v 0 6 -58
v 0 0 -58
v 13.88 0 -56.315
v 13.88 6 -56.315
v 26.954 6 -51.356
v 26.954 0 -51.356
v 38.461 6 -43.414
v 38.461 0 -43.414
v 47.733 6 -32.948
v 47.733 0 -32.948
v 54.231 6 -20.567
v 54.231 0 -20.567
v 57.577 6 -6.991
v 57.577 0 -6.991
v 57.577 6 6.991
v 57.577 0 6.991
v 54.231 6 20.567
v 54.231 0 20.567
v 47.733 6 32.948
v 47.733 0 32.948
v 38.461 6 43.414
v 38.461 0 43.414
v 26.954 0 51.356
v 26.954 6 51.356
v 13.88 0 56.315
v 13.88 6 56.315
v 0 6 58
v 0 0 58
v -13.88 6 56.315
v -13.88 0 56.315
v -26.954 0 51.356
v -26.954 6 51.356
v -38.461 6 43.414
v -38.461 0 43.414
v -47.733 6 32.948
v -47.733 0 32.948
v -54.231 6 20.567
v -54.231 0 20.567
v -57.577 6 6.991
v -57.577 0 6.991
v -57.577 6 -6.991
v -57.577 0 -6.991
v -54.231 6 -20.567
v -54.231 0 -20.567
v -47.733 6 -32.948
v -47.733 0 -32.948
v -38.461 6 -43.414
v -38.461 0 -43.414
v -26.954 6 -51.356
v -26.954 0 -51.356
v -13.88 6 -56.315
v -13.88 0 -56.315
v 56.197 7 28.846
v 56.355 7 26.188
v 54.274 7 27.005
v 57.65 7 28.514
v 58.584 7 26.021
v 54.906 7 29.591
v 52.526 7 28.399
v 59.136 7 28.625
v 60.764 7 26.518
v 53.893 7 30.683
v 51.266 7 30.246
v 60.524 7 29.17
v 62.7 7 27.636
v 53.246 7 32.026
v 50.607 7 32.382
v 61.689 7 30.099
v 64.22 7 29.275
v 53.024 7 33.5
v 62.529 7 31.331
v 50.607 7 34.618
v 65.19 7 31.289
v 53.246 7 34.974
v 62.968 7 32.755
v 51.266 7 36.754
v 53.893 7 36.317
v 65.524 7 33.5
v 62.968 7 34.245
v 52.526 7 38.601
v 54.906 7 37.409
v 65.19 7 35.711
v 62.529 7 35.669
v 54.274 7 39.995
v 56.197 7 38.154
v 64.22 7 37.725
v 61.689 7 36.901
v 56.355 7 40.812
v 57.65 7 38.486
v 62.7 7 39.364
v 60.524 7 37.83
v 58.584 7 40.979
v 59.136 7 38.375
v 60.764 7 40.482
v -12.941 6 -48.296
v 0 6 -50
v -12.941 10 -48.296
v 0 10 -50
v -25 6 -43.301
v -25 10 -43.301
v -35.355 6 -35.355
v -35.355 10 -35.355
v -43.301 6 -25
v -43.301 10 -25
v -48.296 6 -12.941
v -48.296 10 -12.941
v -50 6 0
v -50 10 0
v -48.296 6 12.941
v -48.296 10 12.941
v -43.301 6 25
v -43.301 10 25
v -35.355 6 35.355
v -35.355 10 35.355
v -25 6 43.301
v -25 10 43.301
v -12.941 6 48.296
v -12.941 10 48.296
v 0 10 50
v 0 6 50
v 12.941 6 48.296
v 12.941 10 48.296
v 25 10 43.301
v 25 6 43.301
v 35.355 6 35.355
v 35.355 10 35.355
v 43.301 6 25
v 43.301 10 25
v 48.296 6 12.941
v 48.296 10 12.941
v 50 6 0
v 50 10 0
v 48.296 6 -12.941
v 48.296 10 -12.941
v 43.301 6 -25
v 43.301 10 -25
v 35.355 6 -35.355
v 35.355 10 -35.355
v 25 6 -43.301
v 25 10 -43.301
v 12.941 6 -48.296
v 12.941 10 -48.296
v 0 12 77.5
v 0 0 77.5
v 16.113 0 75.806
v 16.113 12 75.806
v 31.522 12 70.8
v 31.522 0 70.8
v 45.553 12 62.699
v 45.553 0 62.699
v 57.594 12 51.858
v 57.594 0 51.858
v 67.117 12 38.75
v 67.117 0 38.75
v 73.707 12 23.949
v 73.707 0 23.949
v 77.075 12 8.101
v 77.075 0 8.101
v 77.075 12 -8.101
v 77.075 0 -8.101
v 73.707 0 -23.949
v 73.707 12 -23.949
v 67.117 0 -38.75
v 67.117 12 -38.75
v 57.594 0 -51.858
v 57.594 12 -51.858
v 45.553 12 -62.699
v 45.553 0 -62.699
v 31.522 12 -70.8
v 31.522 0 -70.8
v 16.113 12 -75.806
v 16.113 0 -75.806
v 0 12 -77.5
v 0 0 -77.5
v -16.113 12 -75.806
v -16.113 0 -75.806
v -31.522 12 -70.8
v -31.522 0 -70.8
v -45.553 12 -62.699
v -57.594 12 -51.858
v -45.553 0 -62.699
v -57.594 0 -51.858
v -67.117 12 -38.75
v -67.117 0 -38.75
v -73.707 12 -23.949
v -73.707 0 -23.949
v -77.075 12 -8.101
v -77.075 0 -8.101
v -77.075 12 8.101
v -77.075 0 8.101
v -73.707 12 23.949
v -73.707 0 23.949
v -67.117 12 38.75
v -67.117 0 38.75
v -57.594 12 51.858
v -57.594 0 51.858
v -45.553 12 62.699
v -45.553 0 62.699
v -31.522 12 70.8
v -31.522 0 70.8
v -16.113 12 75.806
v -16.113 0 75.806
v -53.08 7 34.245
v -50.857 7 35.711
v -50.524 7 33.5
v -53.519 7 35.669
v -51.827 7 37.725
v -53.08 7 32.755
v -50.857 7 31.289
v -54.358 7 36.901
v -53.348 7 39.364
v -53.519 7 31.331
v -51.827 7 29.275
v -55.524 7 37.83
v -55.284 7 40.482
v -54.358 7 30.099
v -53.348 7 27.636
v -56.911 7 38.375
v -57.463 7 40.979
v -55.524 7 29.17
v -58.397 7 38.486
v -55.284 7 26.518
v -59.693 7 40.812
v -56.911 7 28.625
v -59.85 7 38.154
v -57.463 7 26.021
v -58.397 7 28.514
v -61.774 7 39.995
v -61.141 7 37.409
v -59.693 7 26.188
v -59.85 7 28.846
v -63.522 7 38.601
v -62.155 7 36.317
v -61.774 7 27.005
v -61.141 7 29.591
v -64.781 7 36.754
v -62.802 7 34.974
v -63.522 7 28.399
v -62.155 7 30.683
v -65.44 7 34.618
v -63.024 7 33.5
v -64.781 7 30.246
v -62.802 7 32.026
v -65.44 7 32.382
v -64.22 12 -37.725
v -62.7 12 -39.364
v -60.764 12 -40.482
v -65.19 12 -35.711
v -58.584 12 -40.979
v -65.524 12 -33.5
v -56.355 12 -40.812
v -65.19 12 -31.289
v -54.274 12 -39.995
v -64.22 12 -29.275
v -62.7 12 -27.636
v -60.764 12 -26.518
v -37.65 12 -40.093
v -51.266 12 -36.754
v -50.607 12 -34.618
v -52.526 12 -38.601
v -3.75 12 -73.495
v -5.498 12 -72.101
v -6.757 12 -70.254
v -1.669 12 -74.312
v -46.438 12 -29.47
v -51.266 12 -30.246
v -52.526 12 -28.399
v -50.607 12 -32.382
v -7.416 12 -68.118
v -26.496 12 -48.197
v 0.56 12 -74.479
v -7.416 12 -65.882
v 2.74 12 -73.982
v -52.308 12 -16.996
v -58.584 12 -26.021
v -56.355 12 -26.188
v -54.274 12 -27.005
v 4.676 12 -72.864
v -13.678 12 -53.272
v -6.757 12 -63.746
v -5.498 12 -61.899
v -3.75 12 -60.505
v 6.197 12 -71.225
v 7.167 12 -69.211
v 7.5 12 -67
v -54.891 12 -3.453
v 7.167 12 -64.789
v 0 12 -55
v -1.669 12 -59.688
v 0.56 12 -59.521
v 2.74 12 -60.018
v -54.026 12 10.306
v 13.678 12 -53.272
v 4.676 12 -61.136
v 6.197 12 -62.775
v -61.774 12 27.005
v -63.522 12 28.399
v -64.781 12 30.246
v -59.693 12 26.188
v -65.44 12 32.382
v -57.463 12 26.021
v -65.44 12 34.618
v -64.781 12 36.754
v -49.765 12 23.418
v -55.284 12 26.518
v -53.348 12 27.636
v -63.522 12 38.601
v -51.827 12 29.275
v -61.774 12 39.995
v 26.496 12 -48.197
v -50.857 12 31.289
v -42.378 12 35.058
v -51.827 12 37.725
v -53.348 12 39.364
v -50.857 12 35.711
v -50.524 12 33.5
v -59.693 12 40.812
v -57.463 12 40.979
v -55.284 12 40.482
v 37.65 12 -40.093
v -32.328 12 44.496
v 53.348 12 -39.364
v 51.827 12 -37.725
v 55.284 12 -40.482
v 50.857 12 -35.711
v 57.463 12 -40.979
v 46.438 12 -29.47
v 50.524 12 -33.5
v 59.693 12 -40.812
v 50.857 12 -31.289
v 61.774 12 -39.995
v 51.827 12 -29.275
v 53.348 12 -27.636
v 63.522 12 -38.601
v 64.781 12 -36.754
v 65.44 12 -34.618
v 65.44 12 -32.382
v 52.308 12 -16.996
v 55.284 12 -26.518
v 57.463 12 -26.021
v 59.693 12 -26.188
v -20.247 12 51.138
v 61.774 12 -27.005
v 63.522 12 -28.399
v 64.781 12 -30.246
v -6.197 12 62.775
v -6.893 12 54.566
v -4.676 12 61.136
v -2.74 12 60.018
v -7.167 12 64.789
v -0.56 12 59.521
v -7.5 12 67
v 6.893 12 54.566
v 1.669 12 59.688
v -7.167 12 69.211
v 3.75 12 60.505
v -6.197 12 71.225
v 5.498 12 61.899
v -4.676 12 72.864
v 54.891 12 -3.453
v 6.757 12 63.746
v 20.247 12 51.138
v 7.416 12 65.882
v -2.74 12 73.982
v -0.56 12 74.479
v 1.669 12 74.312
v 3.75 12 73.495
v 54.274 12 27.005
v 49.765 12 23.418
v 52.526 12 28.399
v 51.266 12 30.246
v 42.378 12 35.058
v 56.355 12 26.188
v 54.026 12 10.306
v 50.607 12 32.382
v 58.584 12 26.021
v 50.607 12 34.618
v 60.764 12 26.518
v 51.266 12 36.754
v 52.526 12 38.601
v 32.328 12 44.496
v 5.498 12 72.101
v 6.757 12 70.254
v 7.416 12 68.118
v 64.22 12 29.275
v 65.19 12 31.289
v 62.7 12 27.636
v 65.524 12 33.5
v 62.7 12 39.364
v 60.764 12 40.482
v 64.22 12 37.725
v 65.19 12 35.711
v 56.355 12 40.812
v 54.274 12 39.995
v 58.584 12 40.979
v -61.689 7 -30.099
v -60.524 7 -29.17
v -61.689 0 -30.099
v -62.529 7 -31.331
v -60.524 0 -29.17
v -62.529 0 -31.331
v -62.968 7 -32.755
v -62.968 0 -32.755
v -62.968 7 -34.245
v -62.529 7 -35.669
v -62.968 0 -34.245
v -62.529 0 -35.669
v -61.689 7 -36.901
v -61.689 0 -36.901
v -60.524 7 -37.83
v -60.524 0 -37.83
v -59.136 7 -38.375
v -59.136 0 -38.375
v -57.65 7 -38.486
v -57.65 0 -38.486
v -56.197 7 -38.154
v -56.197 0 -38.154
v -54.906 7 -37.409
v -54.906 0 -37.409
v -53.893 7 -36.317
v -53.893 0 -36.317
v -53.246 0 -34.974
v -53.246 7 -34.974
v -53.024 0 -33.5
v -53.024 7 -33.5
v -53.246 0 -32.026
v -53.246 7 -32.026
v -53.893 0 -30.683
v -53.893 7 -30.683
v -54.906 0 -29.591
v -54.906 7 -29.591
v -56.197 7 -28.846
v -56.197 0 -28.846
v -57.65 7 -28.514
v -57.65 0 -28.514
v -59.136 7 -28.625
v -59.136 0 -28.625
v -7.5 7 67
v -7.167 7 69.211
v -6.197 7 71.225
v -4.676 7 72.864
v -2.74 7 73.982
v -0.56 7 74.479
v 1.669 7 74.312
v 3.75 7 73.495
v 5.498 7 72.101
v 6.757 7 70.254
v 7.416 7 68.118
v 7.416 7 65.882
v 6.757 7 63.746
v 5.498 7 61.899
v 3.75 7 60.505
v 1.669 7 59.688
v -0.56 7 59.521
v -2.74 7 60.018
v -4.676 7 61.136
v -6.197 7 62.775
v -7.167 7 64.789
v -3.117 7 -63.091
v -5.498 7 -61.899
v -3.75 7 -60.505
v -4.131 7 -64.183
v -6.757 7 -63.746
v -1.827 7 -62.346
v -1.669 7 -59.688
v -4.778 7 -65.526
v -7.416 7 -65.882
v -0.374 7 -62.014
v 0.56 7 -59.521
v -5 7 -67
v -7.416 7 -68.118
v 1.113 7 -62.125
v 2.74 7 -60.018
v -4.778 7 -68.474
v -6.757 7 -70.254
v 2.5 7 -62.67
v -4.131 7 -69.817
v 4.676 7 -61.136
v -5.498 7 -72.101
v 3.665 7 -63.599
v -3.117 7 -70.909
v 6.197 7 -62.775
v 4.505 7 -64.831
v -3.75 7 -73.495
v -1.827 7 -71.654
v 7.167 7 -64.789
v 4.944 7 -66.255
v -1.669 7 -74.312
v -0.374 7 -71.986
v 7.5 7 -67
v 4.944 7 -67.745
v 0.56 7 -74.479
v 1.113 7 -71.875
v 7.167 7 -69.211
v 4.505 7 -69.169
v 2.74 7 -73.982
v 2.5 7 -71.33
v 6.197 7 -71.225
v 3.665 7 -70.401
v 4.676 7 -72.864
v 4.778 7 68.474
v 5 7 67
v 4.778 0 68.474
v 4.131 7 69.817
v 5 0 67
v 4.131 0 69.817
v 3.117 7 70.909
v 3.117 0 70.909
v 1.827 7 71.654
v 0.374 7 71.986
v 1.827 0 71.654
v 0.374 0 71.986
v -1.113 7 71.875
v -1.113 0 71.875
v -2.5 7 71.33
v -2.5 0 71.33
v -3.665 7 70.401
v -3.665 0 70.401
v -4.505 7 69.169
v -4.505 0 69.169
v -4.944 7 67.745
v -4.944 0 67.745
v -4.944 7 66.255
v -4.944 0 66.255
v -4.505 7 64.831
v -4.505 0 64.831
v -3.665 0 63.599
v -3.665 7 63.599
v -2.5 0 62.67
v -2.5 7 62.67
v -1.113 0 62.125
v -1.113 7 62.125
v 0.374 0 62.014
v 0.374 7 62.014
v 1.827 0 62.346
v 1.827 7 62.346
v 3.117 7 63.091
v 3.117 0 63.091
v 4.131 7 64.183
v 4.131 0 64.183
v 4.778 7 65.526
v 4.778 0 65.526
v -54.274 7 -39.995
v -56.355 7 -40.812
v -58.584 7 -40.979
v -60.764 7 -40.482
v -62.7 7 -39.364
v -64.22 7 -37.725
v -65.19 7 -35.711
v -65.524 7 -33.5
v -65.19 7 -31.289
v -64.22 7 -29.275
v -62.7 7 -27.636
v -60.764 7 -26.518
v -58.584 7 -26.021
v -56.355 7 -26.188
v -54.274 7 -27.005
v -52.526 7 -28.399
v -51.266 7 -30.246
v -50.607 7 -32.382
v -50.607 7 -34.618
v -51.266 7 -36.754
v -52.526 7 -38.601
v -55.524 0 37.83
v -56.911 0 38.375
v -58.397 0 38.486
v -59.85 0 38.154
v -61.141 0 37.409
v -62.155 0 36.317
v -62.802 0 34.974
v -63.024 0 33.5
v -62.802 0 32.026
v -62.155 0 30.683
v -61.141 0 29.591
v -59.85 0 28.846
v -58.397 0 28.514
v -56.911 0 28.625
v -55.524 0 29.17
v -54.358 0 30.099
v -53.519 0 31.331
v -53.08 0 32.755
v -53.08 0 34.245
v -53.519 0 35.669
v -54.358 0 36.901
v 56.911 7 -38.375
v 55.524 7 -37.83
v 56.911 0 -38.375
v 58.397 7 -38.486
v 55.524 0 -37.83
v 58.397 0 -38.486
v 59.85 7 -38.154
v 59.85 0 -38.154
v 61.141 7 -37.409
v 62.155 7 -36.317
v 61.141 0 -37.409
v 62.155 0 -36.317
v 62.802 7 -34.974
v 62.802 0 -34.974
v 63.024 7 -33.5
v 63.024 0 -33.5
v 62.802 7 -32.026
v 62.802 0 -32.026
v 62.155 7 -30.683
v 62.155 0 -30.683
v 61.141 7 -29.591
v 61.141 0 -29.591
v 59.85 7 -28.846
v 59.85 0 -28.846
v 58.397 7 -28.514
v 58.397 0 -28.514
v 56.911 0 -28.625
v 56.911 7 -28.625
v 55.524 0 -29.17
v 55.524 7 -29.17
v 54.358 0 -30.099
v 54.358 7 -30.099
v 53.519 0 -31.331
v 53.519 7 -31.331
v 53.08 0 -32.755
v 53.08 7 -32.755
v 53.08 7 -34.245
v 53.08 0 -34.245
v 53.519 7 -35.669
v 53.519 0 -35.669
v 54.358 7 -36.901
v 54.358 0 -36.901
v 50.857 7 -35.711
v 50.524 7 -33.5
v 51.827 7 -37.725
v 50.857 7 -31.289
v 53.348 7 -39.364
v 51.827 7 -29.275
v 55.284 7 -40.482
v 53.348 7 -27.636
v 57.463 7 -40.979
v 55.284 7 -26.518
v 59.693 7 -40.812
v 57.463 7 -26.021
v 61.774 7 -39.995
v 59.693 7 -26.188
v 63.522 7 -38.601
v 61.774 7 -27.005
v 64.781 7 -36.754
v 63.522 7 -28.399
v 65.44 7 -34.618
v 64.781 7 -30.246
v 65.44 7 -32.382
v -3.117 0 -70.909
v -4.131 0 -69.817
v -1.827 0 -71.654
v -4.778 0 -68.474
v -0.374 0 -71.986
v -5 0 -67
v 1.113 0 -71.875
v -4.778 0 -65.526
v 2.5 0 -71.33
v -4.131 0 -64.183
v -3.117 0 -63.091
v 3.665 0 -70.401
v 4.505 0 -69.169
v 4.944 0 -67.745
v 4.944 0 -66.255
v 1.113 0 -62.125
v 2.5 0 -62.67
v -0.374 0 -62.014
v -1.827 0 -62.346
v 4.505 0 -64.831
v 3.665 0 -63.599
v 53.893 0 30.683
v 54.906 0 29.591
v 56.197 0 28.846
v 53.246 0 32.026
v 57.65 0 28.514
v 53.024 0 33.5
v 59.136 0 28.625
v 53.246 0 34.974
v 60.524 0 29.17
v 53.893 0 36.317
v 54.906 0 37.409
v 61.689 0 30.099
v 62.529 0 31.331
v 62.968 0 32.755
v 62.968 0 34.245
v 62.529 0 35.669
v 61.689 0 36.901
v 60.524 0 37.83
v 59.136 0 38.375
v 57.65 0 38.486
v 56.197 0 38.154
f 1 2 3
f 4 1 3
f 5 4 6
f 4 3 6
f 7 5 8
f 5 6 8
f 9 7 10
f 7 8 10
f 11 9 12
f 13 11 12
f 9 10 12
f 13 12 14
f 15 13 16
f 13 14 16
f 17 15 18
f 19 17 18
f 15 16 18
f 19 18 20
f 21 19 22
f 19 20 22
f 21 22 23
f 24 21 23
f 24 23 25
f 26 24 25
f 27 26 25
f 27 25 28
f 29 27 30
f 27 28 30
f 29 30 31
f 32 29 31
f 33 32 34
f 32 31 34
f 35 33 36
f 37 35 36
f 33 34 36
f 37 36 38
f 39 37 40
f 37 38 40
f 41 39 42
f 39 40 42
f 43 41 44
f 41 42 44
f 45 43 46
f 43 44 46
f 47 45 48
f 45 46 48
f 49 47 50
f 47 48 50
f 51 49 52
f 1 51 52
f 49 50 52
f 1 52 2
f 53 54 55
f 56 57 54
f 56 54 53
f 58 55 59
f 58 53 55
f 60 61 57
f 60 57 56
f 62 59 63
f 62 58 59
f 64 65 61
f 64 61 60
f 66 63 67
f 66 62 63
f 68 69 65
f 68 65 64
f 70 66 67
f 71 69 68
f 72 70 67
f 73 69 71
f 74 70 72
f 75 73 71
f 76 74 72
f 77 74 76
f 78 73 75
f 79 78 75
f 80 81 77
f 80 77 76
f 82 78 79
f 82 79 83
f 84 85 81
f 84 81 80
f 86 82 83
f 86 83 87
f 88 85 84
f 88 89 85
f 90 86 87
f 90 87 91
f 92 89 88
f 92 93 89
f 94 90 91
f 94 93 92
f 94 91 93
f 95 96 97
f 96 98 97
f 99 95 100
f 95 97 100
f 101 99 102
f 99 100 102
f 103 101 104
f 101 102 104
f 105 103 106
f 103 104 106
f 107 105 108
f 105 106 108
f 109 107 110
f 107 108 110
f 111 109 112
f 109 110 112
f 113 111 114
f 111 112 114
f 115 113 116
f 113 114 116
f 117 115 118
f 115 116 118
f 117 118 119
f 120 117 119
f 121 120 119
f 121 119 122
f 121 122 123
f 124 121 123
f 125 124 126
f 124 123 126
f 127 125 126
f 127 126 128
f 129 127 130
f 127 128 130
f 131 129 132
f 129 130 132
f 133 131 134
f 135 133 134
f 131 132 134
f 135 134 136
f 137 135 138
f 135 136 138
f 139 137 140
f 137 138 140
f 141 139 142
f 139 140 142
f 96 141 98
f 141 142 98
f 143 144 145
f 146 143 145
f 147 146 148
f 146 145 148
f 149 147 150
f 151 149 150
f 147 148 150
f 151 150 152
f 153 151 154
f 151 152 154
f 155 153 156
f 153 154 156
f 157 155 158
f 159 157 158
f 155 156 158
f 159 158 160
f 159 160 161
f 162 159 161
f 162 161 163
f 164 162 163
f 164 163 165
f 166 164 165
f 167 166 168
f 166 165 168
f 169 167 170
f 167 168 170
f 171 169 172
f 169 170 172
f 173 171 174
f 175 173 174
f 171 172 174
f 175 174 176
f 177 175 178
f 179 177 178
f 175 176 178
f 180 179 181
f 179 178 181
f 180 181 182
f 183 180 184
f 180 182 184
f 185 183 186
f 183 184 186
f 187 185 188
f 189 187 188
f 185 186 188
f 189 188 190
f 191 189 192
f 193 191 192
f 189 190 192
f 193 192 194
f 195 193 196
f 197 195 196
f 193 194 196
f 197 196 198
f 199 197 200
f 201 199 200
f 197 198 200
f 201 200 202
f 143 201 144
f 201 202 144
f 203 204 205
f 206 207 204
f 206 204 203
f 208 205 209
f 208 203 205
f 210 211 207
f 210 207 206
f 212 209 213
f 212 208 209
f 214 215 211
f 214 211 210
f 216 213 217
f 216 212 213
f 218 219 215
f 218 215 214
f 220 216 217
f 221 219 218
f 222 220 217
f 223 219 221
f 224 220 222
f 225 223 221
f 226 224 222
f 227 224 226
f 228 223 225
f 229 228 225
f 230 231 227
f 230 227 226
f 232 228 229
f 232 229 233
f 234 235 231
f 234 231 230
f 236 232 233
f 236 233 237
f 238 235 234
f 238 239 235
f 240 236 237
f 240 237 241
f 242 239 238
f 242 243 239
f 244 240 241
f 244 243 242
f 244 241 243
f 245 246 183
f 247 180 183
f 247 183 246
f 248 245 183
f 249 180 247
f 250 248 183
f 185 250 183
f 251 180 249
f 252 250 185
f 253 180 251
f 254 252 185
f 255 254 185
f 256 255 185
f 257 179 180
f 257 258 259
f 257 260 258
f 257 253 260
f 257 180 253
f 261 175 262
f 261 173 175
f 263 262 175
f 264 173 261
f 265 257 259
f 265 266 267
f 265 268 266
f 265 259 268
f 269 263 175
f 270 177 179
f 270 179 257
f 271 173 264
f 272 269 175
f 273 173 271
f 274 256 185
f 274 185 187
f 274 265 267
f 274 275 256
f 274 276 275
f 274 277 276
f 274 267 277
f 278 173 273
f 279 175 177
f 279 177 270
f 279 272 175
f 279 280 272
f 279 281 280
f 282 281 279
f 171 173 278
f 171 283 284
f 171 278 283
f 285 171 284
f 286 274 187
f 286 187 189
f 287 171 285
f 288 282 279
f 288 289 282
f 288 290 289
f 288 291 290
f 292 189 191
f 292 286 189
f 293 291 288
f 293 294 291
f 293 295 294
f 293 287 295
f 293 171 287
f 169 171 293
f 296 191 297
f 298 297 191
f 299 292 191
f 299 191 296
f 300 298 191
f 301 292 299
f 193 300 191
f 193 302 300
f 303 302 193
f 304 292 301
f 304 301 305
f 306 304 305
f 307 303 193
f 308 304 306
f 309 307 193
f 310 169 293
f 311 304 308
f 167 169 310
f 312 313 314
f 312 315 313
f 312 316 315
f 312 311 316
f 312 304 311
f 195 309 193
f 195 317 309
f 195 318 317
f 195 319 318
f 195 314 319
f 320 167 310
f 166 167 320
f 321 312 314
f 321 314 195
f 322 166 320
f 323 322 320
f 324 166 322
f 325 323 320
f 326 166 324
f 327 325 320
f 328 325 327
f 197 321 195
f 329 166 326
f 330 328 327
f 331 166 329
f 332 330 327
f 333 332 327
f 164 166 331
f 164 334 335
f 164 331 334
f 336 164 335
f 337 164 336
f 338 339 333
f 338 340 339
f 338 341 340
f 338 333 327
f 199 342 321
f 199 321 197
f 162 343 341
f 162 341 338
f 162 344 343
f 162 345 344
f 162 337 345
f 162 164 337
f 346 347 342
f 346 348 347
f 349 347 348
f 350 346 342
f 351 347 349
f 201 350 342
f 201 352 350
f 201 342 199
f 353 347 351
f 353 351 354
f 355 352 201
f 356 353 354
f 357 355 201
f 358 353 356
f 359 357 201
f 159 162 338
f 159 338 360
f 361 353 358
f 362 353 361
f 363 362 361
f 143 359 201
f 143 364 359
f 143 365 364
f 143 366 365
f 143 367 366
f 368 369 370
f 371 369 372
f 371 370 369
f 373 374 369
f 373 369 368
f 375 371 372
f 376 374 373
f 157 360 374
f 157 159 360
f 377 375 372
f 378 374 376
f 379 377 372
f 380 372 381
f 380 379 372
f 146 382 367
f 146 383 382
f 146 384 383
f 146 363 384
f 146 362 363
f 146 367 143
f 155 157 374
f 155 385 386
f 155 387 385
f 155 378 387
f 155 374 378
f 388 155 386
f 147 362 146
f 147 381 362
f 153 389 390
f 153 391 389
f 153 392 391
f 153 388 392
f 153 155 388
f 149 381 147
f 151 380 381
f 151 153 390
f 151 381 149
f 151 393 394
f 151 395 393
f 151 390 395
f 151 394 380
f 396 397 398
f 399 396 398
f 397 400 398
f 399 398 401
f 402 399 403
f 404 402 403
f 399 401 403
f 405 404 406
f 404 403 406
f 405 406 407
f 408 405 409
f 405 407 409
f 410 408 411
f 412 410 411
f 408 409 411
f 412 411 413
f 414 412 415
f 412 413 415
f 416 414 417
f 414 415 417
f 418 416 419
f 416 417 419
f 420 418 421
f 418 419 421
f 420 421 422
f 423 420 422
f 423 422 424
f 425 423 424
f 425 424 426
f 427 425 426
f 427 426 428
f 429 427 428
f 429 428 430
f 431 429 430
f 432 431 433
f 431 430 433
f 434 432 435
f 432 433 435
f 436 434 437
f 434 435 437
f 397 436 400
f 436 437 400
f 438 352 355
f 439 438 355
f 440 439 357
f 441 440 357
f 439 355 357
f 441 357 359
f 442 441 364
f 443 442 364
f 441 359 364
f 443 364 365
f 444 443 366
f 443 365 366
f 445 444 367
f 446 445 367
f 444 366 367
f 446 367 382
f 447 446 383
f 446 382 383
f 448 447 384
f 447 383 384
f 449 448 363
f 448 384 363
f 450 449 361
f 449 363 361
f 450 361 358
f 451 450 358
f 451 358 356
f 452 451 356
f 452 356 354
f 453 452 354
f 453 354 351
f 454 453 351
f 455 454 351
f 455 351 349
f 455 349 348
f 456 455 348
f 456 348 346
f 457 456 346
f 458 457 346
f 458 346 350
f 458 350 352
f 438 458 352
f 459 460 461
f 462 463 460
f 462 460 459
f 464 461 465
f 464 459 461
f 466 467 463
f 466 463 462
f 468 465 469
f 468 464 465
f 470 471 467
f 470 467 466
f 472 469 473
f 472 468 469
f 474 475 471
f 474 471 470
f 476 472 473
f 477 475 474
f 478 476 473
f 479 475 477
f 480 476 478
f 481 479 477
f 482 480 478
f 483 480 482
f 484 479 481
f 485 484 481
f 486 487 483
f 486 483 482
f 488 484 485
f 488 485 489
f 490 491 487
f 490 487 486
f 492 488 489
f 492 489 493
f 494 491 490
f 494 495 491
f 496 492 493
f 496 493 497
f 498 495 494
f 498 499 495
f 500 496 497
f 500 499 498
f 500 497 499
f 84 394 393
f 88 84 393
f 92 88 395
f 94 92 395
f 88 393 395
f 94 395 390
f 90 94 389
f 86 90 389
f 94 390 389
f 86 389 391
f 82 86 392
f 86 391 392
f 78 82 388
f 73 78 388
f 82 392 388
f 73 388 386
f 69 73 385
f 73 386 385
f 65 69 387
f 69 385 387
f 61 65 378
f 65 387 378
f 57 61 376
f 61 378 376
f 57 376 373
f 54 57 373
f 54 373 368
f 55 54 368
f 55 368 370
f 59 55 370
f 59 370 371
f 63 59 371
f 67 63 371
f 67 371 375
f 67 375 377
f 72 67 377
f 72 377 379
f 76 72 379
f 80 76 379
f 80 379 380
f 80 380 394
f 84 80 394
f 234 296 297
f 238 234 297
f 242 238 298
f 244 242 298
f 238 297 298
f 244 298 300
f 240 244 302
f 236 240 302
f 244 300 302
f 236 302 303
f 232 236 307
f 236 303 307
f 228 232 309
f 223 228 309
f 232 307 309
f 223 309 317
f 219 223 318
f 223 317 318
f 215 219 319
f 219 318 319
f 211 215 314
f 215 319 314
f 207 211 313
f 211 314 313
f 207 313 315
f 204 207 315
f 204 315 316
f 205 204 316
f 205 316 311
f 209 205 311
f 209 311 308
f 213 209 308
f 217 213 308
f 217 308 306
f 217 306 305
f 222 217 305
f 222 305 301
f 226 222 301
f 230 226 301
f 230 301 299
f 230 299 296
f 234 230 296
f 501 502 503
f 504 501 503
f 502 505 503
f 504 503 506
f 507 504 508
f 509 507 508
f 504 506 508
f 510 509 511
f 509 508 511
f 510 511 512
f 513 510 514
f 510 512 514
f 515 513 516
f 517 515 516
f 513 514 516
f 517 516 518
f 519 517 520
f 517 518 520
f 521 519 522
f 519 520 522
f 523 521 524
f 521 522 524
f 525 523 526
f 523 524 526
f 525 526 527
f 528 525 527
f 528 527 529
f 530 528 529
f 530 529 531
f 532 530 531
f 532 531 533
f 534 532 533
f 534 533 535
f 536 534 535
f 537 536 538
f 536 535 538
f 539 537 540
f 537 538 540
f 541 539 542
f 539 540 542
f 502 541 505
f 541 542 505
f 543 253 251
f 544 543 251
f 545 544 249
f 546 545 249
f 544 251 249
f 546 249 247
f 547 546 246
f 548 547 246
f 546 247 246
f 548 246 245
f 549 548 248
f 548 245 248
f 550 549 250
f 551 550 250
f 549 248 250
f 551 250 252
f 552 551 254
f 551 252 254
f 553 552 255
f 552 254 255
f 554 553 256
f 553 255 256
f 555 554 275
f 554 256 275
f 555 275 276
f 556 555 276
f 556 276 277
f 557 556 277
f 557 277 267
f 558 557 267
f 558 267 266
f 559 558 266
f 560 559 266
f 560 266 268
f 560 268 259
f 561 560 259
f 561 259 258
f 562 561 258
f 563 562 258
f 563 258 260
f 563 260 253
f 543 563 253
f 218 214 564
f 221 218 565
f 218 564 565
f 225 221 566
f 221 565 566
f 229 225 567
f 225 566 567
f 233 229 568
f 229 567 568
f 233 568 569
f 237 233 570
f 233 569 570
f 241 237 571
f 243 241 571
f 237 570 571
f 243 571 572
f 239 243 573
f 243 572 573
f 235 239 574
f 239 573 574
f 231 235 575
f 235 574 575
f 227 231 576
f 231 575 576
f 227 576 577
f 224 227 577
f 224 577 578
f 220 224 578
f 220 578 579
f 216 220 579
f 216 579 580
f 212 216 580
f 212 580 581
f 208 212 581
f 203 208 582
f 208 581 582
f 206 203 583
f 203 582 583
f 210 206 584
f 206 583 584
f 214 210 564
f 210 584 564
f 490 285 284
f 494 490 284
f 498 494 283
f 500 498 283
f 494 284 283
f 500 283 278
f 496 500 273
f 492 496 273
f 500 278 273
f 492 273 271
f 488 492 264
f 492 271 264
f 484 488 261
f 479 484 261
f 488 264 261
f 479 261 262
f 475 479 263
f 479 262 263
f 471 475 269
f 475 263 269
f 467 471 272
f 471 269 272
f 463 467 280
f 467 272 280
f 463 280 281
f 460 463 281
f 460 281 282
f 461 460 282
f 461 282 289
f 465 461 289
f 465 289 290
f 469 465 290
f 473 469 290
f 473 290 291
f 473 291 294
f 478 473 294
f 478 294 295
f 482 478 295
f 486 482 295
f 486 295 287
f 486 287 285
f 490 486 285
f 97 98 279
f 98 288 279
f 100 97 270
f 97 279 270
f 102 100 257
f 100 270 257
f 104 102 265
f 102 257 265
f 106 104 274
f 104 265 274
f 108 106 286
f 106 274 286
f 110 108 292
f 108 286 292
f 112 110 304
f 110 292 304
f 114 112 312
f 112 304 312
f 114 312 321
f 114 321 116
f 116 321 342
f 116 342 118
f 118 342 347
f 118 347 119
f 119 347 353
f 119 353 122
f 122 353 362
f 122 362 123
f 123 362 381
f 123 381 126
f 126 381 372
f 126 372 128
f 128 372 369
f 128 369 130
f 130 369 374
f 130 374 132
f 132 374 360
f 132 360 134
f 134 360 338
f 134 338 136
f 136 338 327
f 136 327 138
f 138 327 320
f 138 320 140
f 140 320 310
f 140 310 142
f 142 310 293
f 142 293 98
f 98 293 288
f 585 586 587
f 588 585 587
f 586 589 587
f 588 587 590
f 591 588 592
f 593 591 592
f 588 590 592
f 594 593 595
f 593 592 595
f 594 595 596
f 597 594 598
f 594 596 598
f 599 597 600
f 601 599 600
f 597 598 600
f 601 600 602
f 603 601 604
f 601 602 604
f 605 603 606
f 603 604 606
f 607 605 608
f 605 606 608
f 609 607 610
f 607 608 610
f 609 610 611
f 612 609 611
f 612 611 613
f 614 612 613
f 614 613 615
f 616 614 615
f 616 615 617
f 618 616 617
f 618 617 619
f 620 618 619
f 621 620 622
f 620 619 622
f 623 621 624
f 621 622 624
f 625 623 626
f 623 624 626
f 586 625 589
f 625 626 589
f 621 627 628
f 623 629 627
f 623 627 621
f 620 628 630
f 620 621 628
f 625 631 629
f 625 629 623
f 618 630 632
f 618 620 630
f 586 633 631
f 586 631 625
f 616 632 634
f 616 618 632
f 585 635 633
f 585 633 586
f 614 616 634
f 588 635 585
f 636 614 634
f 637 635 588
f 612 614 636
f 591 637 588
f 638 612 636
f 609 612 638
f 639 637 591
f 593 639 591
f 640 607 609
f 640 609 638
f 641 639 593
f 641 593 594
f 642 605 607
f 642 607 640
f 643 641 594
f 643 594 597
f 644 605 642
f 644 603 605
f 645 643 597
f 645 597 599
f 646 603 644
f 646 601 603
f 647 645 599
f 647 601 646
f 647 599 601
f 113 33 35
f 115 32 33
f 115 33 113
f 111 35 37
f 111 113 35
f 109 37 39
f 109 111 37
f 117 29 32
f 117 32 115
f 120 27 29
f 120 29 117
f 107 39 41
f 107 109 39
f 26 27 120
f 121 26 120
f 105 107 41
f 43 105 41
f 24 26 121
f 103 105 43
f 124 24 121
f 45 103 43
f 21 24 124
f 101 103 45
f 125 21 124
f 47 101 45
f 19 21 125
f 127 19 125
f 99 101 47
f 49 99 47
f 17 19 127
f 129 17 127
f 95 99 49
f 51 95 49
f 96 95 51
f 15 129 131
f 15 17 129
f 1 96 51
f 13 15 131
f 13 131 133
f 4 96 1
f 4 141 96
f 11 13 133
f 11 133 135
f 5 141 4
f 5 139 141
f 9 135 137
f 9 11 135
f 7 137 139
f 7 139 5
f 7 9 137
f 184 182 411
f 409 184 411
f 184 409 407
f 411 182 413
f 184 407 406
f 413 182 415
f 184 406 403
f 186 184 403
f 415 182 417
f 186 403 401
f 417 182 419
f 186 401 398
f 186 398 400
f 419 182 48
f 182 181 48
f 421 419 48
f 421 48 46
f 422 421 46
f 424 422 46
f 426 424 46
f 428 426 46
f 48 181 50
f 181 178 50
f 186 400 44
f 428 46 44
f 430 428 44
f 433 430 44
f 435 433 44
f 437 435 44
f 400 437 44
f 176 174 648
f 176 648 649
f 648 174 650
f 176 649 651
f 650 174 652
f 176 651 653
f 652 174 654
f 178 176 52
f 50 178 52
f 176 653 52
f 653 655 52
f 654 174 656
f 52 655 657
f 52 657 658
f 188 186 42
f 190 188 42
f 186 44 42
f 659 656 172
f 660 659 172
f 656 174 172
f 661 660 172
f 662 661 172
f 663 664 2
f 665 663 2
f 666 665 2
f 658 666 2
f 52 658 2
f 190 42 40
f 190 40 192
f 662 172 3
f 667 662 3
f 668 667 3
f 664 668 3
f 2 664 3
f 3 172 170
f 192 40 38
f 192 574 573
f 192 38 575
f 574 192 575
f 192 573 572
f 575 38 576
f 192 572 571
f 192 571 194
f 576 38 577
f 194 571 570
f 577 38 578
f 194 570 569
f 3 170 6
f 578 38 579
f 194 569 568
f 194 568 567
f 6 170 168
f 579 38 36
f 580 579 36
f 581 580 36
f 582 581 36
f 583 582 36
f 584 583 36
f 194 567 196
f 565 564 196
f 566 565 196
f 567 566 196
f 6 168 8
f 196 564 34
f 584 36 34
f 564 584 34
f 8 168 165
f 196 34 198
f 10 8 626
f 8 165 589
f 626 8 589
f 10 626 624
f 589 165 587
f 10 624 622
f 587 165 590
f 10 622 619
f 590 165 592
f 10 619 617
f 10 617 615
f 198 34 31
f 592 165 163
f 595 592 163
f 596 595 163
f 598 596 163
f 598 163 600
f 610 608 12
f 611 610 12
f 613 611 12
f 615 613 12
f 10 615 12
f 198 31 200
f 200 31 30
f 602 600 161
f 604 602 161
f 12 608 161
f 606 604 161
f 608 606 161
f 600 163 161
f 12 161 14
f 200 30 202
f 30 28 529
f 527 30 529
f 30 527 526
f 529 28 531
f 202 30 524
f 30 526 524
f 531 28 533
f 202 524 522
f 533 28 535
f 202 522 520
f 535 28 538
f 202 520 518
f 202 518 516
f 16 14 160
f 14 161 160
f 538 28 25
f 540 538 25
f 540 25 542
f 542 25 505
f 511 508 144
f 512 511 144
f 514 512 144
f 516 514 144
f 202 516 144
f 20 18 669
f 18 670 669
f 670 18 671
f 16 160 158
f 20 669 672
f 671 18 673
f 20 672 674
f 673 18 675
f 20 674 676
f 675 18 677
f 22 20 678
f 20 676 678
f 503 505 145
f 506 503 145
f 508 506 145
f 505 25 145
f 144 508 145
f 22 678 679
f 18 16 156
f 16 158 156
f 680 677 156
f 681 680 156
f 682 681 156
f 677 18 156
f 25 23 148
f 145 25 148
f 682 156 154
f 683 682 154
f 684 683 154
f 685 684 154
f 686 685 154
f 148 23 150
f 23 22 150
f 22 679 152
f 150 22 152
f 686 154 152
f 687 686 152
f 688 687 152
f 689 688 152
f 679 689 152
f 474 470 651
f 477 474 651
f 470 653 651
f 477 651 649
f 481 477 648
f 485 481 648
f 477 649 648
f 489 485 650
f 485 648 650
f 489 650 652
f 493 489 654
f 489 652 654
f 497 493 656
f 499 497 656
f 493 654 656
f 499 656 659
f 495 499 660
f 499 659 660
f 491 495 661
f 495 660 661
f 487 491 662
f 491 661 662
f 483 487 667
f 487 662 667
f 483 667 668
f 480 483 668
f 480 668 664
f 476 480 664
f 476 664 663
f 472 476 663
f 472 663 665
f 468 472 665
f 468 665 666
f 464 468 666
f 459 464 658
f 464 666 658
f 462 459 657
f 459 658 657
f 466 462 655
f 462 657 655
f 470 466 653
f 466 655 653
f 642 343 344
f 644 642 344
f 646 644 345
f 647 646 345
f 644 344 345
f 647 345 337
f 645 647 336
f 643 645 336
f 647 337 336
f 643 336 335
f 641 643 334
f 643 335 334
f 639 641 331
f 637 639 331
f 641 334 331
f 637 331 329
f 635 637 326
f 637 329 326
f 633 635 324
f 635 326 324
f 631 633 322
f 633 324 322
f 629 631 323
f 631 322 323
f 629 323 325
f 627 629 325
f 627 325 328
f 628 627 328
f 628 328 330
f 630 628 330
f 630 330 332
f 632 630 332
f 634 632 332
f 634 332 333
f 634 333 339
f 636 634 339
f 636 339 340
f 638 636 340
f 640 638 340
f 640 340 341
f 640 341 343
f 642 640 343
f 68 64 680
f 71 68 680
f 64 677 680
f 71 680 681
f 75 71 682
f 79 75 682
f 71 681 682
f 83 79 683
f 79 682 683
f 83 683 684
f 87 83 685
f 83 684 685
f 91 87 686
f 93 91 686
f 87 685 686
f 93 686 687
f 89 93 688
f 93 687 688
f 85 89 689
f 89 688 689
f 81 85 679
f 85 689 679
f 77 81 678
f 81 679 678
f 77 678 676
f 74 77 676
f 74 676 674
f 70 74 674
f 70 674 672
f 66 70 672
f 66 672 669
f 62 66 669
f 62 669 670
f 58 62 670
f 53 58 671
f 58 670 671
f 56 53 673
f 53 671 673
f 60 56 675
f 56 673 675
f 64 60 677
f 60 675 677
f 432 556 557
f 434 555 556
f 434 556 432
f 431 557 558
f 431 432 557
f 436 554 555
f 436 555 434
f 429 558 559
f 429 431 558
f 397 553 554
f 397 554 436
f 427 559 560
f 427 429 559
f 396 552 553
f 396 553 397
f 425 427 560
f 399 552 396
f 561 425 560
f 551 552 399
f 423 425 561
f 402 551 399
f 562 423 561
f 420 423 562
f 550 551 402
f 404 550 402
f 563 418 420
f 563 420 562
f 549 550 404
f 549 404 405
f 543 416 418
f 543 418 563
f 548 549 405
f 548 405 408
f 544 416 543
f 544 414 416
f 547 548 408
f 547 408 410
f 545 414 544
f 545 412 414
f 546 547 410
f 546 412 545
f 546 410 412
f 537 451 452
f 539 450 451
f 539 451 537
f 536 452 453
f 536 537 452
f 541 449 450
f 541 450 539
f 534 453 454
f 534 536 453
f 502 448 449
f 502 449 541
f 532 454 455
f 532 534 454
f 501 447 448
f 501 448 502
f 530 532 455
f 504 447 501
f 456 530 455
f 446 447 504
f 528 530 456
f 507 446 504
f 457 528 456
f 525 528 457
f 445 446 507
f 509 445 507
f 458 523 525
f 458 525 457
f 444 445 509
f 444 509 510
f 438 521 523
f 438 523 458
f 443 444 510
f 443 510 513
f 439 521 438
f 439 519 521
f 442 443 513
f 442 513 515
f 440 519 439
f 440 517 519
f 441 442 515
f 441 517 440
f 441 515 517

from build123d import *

# Parameters (mm, degrees)
SKETCH_1_R                    = 77.5
EXTRUDE_D155_DEPTH            = 12
SKETCH_3_R                    = 58
CUT_EXTRUDE_D116_2_DEPTH      = 6
HOLE_WIZARD_M10_6_D           = 10
HOLE_WIZARD_M10_6_CBORE_D     = 15
HOLE_WIZARD_M10_6_CBORE_DEPTH = 5
PATTERN_CIRCULAR_M10_6_COUNT  = 6


with BuildPart() as part:
    # 草图1 → D155 观察窗外盖 (new body)
    with BuildSketch(Plane(origin=(0, 0, 0), x_dir=(1, 0, 0), z_dir=(0, 1, 0))):
        with Locations(Location((0, 0, 0), (0, 0, 270))):
            Circle(SKETCH_1_R)
    extrude(amount=EXTRUDE_D155_DEPTH)

    # 草图2 → D100 内径切除 (revolve, cut)
    with BuildSketch(Plane.XY, mode=Mode.PRIVATE) as cut_revolve_d100_sk:
        Polygon((50, 10), (55, 12), (50, 12), (0, 12), (0, 0), (50, 0), align=None)
    revolve(cut_revolve_d100_sk.sketch.rotate(Axis((0, 0, 0), (0, 1, 0)), 90), axis=Axis((0, 0, 0), (0, 1, 0)), mode=Mode.SUBTRACT)

    # 草图3 → D116*2 橡胶垫(外径) (cut)
    with BuildSketch(Plane.XZ):
        with Locations(Location((0, 0, 0), (0, 0, 270))):
            Circle(SKETCH_3_R)
    extrude(amount=-CUT_EXTRUDE_D116_2_DEPTH, mode=Mode.SUBTRACT)

    # M10*6 柱形沉头孔 (through all)
    with Locations(Plane(origin=(0, 12, 0), x_dir=(1, 0, 0), z_dir=(0, 1, 0))):
        with Locations((0, 67)):
            hole_wizard_m10_6 = CounterBoreHole(HOLE_WIZARD_M10_6_D / 2, HOLE_WIZARD_M10_6_CBORE_D / 2, HOLE_WIZARD_M10_6_CBORE_DEPTH)

    # M10*6 圆周阵列: M10*6 柱形沉头孔 ×6 about axis
    pattern_circular_m10_6_axis = Axis((0, 0, 0), (0, 1, 0))
    for i in range(1, PATTERN_CIRCULAR_M10_6_COUNT):
        add(hole_wizard_m10_6.rotate(pattern_circular_m10_6_axis, i * 360 / PATTERN_CIRCULAR_M10_6_COUNT), mode=Mode.SUBTRACT)


solid = part.part
